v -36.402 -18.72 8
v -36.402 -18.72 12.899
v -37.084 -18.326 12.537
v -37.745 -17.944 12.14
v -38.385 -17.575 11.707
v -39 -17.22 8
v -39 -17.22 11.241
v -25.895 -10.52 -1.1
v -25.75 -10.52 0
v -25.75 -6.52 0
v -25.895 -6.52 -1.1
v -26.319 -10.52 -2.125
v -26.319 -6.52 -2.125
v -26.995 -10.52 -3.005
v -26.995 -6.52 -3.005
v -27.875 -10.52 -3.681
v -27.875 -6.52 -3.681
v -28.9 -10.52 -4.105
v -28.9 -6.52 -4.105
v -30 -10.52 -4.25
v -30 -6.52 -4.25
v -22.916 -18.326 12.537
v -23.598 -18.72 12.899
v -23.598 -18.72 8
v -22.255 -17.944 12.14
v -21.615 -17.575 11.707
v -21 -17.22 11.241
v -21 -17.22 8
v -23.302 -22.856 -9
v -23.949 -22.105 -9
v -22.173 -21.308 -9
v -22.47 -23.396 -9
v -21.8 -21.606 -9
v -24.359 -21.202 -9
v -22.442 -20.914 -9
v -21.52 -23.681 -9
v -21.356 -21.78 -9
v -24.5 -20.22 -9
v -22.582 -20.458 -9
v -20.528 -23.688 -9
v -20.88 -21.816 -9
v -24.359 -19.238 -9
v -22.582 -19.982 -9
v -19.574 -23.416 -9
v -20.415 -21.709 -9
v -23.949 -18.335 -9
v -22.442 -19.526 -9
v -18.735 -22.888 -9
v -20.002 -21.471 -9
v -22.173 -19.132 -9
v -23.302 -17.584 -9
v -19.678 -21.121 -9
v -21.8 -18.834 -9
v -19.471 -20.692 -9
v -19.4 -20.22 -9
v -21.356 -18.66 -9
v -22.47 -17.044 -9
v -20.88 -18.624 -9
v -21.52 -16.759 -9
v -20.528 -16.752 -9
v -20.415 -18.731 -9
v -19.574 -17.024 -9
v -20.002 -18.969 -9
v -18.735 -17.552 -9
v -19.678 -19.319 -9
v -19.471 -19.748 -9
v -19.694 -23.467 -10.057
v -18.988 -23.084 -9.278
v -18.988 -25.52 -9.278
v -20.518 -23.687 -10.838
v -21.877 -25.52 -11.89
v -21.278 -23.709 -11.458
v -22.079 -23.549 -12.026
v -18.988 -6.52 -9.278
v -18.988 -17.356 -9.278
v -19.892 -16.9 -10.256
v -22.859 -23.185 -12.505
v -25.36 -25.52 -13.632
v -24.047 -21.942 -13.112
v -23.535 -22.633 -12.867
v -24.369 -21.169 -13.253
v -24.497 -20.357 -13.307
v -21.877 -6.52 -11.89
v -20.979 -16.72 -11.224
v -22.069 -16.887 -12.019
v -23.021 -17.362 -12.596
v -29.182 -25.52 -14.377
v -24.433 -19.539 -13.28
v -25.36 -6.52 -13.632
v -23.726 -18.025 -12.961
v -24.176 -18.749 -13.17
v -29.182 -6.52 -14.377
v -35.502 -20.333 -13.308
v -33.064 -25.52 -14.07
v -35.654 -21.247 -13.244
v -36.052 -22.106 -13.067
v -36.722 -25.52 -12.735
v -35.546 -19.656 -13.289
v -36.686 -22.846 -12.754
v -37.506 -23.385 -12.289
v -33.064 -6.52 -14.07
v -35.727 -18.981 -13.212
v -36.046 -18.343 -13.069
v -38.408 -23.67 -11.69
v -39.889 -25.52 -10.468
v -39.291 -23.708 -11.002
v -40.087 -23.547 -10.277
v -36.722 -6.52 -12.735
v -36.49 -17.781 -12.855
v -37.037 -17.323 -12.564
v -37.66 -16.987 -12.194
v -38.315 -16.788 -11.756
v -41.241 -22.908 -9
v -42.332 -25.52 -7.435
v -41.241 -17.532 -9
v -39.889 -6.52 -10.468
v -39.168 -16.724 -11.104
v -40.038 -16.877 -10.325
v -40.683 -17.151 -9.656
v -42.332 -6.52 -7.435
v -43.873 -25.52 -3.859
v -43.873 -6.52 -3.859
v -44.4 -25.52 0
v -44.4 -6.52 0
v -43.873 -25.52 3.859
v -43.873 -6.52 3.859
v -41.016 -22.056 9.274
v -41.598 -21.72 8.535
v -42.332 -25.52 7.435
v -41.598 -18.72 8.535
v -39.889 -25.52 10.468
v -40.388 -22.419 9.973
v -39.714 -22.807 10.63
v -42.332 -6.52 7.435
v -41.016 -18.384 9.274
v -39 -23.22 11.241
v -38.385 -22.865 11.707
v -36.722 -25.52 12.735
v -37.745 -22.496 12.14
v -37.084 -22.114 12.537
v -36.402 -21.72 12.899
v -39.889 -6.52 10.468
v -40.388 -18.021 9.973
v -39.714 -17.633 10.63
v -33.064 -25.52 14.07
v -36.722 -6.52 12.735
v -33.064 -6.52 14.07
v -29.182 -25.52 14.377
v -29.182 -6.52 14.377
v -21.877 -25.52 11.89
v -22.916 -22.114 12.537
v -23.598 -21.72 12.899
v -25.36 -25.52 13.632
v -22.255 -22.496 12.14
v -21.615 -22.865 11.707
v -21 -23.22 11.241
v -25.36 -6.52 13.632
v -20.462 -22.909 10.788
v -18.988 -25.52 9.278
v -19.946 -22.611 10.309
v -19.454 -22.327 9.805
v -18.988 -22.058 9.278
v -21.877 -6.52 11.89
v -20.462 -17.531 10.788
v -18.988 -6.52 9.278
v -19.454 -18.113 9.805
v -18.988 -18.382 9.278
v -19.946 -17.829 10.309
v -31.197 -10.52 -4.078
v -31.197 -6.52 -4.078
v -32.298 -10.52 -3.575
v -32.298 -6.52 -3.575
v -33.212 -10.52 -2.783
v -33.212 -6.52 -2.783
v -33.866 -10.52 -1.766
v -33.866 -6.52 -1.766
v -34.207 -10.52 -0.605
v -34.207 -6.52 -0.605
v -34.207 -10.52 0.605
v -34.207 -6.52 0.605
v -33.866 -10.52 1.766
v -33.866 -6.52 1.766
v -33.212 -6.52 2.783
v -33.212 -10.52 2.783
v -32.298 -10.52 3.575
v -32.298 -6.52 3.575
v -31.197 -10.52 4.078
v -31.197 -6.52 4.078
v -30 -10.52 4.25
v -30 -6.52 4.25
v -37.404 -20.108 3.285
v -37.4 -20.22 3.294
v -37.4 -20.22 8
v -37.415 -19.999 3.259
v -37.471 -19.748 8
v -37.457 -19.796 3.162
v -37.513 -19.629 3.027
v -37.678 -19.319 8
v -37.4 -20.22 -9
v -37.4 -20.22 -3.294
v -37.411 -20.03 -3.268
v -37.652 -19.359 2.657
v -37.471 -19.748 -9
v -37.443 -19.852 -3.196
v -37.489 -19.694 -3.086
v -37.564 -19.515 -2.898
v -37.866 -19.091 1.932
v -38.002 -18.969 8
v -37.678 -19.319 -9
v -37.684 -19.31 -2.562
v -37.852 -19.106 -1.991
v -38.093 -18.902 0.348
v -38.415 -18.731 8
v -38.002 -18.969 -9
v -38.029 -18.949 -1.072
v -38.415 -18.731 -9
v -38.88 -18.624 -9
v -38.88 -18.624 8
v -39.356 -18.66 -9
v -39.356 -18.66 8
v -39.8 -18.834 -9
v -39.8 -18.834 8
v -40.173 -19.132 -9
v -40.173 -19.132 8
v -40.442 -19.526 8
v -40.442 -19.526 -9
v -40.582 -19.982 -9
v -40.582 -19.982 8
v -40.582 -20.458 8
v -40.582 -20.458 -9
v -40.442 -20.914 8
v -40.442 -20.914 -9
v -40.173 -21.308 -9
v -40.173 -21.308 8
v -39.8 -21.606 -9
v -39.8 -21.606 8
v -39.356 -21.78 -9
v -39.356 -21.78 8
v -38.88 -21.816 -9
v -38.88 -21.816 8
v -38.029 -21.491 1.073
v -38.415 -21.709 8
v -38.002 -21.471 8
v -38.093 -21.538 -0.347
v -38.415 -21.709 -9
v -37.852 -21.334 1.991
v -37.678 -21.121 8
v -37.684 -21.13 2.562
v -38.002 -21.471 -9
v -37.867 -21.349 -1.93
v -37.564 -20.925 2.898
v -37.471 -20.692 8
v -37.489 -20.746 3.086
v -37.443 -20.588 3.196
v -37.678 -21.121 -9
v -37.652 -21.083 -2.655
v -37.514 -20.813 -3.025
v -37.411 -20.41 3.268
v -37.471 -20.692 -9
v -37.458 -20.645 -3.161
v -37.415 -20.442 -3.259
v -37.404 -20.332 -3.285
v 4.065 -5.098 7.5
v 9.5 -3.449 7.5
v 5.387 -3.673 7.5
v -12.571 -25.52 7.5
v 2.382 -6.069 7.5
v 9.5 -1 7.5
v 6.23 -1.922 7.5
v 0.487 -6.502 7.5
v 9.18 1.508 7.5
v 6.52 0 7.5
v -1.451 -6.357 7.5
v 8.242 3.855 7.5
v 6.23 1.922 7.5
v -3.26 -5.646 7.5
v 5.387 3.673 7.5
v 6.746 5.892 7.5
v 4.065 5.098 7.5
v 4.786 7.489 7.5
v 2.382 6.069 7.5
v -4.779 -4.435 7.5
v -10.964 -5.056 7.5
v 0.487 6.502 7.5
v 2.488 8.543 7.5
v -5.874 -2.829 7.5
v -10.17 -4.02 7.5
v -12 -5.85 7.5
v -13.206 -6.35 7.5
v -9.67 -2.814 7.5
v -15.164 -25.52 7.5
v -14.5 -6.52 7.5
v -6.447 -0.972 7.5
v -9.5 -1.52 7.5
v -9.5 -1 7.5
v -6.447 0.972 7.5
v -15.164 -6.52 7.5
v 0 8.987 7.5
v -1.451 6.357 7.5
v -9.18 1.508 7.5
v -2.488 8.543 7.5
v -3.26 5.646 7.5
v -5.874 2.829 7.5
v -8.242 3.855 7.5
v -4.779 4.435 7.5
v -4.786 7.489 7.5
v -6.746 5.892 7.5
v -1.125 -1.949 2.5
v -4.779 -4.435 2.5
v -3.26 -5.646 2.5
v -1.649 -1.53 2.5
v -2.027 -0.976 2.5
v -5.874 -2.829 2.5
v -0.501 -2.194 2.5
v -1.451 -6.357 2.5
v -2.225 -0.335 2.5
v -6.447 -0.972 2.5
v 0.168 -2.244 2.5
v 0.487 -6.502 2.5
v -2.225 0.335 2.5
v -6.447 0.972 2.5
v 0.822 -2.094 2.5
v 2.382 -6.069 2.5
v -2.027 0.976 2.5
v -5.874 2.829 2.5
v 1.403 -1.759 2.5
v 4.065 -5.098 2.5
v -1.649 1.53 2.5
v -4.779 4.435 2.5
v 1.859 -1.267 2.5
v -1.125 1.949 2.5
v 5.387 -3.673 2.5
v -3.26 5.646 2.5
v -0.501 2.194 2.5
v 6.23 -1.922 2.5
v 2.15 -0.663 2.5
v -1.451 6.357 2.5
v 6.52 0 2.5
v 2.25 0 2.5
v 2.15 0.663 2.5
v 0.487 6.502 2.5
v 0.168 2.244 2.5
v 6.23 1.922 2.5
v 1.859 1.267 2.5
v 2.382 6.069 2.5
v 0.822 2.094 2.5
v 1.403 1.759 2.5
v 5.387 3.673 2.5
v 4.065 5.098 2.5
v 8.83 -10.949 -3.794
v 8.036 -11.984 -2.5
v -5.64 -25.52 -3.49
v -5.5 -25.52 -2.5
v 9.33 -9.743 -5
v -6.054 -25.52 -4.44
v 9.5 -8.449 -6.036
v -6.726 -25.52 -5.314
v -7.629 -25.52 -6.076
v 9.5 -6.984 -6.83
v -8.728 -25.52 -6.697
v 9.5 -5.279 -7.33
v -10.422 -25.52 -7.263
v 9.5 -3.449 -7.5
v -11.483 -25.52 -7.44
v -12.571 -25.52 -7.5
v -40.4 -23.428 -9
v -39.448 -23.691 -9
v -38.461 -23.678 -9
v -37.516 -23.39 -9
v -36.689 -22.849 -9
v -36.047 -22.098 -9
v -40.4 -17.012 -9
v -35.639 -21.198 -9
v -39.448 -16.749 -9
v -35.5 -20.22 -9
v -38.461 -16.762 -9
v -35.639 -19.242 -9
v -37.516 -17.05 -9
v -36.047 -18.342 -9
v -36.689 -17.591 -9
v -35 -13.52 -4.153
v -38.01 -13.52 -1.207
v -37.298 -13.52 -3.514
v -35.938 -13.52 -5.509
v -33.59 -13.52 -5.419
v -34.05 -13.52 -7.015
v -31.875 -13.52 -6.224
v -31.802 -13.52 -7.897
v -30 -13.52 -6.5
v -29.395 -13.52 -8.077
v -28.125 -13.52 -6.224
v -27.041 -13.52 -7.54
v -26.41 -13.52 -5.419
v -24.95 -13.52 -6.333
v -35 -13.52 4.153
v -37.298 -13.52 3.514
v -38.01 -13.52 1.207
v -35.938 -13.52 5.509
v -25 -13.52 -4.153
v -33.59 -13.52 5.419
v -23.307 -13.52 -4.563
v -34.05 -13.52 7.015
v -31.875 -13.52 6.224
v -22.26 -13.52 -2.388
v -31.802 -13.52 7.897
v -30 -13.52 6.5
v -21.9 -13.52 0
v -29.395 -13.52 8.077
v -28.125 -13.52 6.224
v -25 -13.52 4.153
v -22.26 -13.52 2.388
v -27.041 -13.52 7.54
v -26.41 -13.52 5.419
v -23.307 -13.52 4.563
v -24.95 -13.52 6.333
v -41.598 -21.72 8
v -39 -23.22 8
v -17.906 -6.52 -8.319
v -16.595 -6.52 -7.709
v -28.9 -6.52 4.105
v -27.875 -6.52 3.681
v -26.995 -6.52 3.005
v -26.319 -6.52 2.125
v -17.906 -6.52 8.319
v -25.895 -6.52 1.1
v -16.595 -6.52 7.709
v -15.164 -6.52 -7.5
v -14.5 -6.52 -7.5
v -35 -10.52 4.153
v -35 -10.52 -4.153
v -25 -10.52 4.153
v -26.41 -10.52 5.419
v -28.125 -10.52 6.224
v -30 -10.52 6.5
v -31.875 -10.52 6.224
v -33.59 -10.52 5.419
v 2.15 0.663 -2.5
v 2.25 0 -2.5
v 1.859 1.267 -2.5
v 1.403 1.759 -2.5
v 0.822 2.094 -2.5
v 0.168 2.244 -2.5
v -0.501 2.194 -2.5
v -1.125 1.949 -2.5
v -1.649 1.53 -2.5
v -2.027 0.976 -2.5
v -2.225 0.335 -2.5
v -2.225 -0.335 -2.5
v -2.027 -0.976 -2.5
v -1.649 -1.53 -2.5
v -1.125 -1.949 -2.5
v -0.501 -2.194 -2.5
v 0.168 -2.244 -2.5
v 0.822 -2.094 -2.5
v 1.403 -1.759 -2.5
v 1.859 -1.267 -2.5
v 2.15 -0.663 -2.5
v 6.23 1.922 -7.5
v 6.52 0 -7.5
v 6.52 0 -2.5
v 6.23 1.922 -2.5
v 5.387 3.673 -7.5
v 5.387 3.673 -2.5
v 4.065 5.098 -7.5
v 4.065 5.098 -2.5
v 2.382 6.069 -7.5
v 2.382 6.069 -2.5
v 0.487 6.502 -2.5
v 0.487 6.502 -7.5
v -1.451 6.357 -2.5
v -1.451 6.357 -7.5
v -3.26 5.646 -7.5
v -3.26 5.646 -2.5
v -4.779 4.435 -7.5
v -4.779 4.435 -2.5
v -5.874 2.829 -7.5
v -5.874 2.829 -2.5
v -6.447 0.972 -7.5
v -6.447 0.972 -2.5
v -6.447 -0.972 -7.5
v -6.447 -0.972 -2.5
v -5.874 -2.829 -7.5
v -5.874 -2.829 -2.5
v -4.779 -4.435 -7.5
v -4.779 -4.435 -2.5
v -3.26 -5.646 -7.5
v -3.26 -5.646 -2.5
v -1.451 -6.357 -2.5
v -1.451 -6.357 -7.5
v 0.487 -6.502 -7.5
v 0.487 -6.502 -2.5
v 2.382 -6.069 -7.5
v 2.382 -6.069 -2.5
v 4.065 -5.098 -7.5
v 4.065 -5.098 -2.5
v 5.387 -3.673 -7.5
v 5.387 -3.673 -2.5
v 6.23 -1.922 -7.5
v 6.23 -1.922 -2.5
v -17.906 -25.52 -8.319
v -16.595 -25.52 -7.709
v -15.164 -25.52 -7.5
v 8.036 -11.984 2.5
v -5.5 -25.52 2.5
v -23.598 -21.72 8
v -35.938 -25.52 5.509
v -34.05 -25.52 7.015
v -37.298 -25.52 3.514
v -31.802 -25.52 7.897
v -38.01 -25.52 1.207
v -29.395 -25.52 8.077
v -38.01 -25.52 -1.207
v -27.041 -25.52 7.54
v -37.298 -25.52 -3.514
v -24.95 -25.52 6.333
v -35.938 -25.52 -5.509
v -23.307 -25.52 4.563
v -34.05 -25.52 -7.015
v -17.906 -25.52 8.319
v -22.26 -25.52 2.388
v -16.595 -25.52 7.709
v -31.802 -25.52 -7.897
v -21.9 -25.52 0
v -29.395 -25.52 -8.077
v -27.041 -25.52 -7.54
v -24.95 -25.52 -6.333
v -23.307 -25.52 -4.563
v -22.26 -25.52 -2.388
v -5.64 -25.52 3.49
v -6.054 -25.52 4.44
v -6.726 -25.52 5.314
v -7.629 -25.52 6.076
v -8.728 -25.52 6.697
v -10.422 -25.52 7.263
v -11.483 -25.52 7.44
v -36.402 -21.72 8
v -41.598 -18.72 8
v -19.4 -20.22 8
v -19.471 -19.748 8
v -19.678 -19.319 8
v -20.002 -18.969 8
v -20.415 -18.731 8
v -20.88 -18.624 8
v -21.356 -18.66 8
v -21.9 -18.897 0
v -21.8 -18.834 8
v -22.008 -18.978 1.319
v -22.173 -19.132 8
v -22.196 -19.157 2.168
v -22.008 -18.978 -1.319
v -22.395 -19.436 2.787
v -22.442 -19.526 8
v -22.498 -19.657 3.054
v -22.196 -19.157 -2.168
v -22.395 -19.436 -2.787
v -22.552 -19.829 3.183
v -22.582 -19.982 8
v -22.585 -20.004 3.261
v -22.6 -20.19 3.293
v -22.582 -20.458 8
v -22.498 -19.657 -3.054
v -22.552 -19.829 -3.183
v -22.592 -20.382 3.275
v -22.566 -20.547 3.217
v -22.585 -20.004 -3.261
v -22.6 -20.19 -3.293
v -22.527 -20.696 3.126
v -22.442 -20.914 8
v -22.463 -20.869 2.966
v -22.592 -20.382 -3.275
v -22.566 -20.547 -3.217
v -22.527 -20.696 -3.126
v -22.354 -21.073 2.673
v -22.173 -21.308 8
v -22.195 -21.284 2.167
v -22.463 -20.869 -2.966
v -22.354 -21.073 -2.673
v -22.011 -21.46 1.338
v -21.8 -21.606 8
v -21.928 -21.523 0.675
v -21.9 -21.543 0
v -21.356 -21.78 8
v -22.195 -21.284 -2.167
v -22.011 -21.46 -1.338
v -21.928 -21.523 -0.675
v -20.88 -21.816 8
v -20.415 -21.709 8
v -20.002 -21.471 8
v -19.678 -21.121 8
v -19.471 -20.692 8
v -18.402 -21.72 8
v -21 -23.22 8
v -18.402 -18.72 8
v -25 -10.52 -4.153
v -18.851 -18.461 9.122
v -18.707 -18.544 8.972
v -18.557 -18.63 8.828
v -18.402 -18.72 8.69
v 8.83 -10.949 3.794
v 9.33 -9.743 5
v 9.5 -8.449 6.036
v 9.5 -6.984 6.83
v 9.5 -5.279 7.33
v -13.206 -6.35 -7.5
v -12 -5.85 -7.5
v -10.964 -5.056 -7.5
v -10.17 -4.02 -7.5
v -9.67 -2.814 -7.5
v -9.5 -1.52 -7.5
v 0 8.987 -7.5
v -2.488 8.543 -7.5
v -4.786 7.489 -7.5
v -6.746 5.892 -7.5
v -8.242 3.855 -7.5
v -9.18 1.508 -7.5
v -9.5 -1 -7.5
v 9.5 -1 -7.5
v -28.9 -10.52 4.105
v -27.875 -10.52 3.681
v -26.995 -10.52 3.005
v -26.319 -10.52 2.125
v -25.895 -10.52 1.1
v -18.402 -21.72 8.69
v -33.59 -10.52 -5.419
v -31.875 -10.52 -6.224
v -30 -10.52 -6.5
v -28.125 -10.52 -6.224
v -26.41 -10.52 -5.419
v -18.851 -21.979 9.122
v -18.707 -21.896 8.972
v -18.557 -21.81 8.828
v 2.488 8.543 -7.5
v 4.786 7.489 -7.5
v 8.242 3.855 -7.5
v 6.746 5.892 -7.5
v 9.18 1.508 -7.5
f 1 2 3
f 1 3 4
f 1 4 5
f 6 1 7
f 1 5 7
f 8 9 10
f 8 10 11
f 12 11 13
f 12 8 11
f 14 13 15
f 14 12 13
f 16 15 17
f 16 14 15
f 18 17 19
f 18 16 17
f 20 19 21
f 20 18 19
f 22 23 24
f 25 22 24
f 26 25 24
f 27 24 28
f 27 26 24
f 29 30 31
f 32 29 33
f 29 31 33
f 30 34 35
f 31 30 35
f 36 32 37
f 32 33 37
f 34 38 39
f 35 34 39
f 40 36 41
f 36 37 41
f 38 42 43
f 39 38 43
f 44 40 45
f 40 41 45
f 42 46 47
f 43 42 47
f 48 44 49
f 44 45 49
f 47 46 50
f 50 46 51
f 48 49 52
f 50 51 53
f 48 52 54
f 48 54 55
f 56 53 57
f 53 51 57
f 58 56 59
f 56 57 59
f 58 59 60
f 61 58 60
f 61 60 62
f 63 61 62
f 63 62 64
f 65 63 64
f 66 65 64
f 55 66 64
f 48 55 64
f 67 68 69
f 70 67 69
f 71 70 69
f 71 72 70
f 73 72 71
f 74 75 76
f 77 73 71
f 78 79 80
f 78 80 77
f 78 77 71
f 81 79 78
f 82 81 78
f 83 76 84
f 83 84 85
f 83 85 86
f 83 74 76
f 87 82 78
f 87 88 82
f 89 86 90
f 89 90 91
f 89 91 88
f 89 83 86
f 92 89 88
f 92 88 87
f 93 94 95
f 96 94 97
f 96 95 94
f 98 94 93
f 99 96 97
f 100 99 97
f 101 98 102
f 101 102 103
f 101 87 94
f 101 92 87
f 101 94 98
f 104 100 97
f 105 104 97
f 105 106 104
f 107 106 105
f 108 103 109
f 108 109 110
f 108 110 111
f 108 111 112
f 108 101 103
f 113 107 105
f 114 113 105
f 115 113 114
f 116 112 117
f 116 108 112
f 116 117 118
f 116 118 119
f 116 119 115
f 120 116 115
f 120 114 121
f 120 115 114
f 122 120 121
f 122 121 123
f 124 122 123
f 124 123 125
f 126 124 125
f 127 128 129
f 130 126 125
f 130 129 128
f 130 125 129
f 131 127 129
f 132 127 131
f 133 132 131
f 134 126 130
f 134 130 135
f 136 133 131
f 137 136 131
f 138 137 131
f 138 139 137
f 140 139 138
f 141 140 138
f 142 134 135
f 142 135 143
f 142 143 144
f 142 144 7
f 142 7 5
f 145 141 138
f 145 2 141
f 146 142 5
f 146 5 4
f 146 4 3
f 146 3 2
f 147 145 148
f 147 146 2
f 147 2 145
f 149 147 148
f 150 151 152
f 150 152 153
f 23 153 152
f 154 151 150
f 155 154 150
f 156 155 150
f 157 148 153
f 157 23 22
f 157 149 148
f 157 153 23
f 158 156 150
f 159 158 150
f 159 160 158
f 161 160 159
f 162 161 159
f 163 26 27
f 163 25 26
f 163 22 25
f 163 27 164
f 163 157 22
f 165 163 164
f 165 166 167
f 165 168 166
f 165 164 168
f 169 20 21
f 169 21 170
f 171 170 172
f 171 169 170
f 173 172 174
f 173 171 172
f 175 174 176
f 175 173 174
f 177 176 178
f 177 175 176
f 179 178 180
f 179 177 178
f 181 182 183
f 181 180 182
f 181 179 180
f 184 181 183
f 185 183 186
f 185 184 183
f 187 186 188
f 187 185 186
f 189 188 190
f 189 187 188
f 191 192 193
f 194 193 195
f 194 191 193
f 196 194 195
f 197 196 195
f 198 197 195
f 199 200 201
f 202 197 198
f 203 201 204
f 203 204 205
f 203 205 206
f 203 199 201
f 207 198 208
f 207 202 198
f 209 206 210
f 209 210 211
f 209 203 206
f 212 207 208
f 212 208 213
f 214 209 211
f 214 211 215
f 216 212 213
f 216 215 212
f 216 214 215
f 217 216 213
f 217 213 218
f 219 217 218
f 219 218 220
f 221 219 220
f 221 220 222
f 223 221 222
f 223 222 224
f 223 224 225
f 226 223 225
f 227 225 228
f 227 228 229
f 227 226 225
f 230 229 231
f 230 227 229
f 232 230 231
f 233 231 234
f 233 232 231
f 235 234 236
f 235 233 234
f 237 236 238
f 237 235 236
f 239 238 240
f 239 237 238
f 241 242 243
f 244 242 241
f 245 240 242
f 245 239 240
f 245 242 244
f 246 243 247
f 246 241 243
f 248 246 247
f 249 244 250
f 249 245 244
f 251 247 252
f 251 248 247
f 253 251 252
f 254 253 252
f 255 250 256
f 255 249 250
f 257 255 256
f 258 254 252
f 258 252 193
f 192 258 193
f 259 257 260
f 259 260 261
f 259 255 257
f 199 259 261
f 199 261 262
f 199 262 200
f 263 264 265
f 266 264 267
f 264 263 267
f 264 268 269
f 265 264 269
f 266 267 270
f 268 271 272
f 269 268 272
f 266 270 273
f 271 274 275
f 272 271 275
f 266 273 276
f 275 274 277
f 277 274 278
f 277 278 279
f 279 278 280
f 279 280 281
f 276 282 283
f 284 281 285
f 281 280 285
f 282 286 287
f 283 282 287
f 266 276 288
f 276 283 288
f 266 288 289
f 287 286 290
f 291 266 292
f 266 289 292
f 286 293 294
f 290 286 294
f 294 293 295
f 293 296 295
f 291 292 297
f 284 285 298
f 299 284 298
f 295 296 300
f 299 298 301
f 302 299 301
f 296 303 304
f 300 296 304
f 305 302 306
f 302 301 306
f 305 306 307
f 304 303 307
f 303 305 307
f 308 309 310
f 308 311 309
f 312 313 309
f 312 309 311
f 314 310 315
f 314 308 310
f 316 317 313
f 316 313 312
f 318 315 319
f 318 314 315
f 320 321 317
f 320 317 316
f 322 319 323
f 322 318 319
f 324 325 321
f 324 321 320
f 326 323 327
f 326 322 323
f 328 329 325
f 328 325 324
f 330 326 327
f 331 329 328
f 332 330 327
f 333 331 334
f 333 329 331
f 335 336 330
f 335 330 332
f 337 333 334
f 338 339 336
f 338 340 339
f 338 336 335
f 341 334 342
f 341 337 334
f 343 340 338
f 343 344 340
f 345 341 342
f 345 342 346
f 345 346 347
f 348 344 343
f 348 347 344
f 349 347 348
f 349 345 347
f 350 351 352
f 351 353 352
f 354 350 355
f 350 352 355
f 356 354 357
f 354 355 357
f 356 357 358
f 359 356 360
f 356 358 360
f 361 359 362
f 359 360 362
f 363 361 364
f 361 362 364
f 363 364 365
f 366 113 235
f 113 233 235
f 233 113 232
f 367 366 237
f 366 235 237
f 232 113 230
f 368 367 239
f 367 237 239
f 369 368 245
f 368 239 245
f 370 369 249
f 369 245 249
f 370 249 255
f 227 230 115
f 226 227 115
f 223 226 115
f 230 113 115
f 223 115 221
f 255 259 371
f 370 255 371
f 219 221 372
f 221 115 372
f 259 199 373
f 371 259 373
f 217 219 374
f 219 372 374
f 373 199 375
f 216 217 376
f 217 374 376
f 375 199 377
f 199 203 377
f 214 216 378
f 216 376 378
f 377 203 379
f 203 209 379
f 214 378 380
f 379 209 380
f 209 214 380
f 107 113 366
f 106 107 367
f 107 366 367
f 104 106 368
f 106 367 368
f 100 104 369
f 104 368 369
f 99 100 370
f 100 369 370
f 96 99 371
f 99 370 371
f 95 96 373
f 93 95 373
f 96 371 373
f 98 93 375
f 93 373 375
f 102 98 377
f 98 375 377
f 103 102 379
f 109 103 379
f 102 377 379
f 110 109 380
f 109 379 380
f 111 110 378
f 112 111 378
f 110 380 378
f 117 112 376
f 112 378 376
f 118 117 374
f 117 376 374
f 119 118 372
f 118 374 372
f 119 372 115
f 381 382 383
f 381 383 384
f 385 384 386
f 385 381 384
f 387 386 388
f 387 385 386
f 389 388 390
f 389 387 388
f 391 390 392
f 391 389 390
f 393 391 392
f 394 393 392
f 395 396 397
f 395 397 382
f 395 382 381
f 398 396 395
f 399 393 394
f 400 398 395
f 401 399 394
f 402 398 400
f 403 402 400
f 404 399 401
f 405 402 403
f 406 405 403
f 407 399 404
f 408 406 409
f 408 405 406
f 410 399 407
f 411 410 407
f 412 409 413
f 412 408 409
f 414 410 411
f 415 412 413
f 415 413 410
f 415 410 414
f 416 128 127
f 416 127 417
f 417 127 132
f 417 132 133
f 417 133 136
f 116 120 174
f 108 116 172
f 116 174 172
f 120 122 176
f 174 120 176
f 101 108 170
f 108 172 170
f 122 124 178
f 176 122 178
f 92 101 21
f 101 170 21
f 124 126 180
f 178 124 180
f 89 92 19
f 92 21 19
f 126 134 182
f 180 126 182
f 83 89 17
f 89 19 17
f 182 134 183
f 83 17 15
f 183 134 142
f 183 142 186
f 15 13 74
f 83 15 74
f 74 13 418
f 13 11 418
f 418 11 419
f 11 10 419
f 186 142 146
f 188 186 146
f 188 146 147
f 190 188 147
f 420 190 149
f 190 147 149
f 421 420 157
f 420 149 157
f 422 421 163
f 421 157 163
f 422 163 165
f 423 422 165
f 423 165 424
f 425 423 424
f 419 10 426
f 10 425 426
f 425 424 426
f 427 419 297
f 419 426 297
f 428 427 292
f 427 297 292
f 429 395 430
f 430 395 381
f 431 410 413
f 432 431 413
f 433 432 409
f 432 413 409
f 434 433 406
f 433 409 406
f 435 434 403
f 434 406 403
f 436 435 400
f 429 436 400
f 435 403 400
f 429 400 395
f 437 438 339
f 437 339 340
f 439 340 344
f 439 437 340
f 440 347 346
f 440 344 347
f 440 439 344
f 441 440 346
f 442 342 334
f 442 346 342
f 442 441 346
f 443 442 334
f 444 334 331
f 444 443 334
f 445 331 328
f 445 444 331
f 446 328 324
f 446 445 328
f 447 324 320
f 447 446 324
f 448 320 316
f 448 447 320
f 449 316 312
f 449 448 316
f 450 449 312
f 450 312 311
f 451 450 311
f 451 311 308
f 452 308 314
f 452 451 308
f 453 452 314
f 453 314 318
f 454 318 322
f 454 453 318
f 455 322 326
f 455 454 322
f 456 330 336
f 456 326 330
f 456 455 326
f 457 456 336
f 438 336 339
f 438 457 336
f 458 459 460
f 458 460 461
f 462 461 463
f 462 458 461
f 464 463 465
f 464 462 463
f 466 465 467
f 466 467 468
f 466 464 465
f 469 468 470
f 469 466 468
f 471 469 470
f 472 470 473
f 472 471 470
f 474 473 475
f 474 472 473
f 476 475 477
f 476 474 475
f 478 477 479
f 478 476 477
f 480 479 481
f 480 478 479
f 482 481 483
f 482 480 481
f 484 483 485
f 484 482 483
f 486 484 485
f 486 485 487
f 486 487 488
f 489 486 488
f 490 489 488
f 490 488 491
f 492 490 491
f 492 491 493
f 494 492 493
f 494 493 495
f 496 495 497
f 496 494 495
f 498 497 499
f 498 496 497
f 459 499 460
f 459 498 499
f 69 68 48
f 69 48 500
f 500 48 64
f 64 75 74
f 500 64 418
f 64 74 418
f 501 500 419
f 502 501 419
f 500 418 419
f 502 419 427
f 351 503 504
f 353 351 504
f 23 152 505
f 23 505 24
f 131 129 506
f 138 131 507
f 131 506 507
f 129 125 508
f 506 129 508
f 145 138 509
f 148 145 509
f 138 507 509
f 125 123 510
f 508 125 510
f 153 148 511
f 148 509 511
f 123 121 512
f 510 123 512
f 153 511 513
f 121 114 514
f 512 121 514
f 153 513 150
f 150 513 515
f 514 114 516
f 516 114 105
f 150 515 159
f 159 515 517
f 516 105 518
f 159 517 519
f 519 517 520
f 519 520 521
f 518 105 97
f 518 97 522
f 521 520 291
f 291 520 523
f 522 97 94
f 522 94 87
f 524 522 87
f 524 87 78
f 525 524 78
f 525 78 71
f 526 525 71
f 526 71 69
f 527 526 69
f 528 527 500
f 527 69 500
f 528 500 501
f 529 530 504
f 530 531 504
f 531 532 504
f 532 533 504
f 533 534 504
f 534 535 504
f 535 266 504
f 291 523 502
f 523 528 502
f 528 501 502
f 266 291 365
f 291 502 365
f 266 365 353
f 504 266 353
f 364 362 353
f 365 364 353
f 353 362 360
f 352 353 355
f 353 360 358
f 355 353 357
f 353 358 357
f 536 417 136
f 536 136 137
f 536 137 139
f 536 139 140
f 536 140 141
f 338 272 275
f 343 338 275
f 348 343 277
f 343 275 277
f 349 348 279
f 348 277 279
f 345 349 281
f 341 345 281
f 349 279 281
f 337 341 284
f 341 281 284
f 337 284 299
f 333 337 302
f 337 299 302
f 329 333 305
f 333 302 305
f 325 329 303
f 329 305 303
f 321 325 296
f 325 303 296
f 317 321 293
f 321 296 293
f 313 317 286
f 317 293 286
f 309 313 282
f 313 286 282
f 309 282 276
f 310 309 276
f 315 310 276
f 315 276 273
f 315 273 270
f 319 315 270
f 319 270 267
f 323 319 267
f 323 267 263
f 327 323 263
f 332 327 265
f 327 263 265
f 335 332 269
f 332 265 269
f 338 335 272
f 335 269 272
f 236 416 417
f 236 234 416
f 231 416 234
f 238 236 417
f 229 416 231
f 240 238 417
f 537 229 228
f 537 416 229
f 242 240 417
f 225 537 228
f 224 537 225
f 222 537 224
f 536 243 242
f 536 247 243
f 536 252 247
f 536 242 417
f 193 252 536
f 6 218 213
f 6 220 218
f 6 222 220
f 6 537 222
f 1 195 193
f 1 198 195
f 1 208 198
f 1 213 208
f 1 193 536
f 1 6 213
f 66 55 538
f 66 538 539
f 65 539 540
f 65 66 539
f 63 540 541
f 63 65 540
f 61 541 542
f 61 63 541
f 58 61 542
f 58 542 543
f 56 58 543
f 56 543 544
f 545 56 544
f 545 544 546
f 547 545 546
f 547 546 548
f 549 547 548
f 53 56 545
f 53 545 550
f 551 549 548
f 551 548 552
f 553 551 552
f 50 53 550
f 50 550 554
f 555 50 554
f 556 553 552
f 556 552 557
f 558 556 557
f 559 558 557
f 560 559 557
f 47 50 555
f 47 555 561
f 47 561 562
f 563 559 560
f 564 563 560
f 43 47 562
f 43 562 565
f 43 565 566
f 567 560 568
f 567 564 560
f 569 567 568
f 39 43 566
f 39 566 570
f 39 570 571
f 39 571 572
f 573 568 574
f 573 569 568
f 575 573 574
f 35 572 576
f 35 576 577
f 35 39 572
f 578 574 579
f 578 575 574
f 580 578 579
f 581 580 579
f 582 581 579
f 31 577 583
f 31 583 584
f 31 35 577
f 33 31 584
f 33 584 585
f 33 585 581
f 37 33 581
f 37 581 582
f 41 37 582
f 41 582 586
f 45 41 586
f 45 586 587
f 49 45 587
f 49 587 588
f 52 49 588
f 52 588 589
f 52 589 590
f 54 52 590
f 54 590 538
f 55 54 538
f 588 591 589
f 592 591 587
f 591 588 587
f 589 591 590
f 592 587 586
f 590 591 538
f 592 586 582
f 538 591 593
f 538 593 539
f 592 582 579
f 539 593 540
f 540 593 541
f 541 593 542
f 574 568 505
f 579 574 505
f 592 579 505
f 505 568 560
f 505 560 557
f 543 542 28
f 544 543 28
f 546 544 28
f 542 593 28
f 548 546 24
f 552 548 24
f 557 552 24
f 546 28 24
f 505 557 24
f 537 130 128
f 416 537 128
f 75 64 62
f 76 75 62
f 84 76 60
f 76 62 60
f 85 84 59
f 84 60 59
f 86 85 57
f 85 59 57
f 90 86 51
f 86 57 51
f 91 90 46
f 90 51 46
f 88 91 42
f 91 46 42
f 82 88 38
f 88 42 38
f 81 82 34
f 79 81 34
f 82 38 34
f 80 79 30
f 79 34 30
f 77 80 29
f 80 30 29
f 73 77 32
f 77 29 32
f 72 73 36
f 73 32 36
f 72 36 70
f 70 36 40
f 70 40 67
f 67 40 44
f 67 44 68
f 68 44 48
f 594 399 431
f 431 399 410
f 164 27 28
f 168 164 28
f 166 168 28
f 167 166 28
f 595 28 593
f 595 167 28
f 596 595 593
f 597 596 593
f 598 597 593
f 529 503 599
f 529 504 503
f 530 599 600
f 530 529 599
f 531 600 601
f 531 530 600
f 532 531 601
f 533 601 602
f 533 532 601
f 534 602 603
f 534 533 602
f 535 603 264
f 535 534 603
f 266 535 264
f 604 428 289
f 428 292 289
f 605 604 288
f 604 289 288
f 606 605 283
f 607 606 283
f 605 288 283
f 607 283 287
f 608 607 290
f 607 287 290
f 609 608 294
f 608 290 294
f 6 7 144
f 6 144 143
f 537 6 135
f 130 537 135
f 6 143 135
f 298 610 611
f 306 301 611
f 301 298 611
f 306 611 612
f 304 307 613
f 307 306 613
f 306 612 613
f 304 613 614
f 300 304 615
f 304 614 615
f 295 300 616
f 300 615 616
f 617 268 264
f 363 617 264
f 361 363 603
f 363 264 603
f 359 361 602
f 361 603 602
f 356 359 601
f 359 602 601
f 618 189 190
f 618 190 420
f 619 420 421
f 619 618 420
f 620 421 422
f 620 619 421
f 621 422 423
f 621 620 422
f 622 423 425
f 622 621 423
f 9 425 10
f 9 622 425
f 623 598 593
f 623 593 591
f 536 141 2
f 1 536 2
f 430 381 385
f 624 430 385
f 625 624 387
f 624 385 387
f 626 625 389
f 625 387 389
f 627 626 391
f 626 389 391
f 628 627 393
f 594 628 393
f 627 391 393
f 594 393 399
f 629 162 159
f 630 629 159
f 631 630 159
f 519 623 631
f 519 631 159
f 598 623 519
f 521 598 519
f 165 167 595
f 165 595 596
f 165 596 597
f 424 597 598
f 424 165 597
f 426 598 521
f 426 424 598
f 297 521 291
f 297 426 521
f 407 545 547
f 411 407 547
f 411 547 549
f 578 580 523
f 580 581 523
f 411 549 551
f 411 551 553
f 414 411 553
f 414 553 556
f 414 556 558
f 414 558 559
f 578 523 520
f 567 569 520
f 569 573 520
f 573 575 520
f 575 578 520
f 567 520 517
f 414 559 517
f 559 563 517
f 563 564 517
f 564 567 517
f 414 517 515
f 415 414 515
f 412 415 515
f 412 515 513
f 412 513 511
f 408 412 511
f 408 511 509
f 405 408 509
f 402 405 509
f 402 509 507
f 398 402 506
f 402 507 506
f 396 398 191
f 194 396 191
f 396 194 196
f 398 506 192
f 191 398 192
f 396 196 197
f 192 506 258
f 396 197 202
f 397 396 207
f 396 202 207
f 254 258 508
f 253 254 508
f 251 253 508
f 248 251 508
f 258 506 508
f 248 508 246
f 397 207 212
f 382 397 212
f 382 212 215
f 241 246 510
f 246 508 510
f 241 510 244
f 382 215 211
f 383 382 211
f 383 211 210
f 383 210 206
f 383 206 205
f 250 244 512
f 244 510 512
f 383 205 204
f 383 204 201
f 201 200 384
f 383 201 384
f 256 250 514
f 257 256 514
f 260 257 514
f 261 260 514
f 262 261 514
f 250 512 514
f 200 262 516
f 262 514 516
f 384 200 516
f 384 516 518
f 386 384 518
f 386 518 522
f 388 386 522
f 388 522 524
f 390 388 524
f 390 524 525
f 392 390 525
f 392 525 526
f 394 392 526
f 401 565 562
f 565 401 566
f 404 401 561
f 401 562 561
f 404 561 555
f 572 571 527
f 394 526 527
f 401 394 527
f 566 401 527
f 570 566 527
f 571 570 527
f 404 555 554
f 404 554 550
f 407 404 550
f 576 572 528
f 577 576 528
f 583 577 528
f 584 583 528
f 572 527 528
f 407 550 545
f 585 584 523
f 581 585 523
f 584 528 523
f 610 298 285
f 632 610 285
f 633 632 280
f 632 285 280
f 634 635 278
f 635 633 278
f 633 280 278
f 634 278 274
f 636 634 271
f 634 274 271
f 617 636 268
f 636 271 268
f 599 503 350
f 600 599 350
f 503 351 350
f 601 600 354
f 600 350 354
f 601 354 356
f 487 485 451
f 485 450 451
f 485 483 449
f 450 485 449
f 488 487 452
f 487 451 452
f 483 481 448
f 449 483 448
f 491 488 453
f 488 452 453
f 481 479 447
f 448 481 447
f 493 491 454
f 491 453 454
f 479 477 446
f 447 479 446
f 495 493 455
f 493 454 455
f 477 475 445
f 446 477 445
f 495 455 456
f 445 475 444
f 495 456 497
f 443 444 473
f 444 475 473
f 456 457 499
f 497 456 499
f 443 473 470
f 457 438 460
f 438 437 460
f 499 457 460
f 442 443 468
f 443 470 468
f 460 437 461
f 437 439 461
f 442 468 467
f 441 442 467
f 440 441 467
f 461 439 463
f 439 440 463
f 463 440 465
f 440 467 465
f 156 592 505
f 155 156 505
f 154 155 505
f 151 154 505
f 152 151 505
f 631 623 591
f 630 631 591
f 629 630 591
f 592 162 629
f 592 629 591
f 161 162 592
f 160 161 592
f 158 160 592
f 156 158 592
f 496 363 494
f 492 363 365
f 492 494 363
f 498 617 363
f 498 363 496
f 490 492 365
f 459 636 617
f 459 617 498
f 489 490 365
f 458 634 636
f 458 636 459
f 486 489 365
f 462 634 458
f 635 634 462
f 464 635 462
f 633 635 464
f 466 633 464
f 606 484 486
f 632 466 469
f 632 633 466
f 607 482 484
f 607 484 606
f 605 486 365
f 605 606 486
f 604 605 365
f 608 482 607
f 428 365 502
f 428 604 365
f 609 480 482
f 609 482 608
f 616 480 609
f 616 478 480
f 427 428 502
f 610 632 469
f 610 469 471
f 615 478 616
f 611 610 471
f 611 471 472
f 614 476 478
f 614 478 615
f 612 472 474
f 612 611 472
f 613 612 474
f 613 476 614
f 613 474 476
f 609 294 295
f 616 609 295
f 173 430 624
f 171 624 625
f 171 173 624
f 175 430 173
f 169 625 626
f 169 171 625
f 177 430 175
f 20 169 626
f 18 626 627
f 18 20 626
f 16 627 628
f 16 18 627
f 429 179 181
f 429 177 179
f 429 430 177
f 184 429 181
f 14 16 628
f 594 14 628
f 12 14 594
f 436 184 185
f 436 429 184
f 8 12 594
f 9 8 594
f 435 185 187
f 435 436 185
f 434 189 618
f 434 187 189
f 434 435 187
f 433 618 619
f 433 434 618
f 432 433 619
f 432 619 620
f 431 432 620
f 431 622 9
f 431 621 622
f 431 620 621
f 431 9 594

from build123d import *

# Parameters (mm, degrees)
SKETCH1_R               = 2.25
BOSS_EXTRUDE1_DEPTH     = 7.5
CUT_EXTRUDE1_START      = 7.5
SKETCH1_3_R             = 6.52
CUT_EXTRUDE1_DEPTH      = 5
CUT_EXTRUDE2_START      = -7.5
SKETCH1_4_R             = 6.52
CUT_EXTRUDE2_DEPTH      = 5
SKETCH2_R               = 14.4
BOSS_EXTRUDE2_DEPTH     = 19
CUT_EXTRUDE3_DEPTH      = 51.395634732
CUT_EXTRUDE3_DEPTH_BACK = 51.395634732
FILLET1_R               = 5
FILLET2_R               = 10
CUT_EXTRUDE6_DEPTH      = 15
SKETCH5_R               = 8.1
CUT_EXTRUDE7_DEPTH      = 12
CUT_EXTRUDE8_DEPTH      = 54.197654084
CUT_EXTRUDE8_DEPTH_BACK = 54.197654084
SKETCH6_R               = 1.6
CUT_EXTRUDE9_START      = 20
SKETCH6_3_R             = 1.6
CUT_EXTRUDE9_DEPTH      = 12
CUT_EXTRUDE10_START     = -9
SKETCH6_4_R             = 3.5
CUT_EXTRUDE10_DEPTH     = 12
FILLET3_R               = 5


with BuildPart() as part:
    # Sketch1 → Boss-Extrude1 (new, symmetric)
    with BuildSketch(Plane.XY):
        Polygon((-9.5, 9), (9.5, 9), (9.5, -10.52), (-5.5, -25.52), (-30, -25.52), (-30, -6.52), (-9.5, -6.52), align=None)
        Circle(SKETCH1_R, mode=Mode.SUBTRACT)
    extrude(amount=BOSS_EXTRUDE1_DEPTH, both=True)

    # Sketch1<3> → Cut-Extrude1 (cut)
    with BuildSketch(Plane.XY.offset(CUT_EXTRUDE1_START)):
        Circle(SKETCH1_3_R)
    extrude(amount=-CUT_EXTRUDE1_DEPTH, mode=Mode.SUBTRACT)

    # Sketch1<4> → Cut-Extrude2 (cut)
    with BuildSketch(Plane.XY.offset(CUT_EXTRUDE2_START)):
        Circle(SKETCH1_4_R)
    extrude(amount=CUT_EXTRUDE2_DEPTH, mode=Mode.SUBTRACT)

    # Sketch2 → Boss-Extrude2 (add, through all)
    with BuildSketch(Plane(origin=(0, -6.52, 0), x_dir=(1, 0, 0), z_dir=(0, 1, 0))):
        with Locations((-30, 0)):
            Circle(SKETCH2_R)
    extrude(amount=-BOSS_EXTRUDE2_DEPTH)

    # Sketch2<3> → Cut-Extrude3 (cut, two sides: drawn at the far end of the back side and taken through both)
    with BuildSketch(Plane(origin=(0, -6.52, 0), x_dir=(1, 0, 0), z_dir=(0, 1, 0)).offset(-CUT_EXTRUDE3_DEPTH_BACK)):
        with BuildLine():
            ThreePointArc((-30, -4.25), (-26.99479618, -3.00520382), (-25.75, 0))
            ThreePointArc((-25.75, 0), (-26.99479618, 3.00520382), (-30, 4.25))
            Line((-30, 4.25), (-30, -4.25))
        make_face()
        with BuildLine():
            Line((-30, -4.25), (-30, 4.25))
            ThreePointArc((-30, 4.25), (-34.25, 0), (-30, -4.25))
        make_face()
    extrude(amount=CUT_EXTRUDE3_DEPTH + CUT_EXTRUDE3_DEPTH_BACK, mode=Mode.SUBTRACT)

    # Fillet1
    fillet1_edges = [part.edges().sort_by_distance(p)[0] for p in [
        (-9.5, -6.52, 0),
        (-17.707319251, -16.02, -7.5),
        (-17.707319251, -16.02, 7.5),
    ]]
    fillet(fillet1_edges, radius=FILLET1_R)

    # Fillet2
    # the kernel refuses this fillet: 10 mm, written as the material it takes off along each edge
    with BuildSketch(Plane(origin=(-9.5, 9, -32.5), x_dir=(0, -1, 0), z_dir=(0, 0, 1))) as fillet2_piece_1:
        with BuildLine():
            CenterArc((FILLET2_R, FILLET2_R), FILLET2_R, 180, 90)
            Line((0, FILLET2_R), (0, 0))
            Line((0, 0), (FILLET2_R, 0))
        make_face()
    extrude(amount=65, mode=Mode.SUBTRACT)
    with BuildSketch(Plane(origin=(9.5, 9, 32.5), x_dir=(-1, 0, 0), z_dir=(0, 0, -1))) as fillet2_piece_2:
        with BuildLine():
            CenterArc((FILLET2_R, -FILLET2_R), FILLET2_R, 90, 90)
            Line((0, -FILLET2_R), (0, 0))
            Line((0, 0), (FILLET2_R, 0))
        make_face()
    extrude(amount=65, mode=Mode.SUBTRACT)

    # Sketch4 → Cut-Extrude6 (cut)
    with BuildSketch(Plane.XZ.offset(25.52)):
        with BuildLine():
            Line((-25, -4.153311931), (-25, 4.153311931))
            ThreePointArc((-25, 4.153311931), (-30, 6.5), (-35, 4.153311931))
            Line((-35, 4.153311931), (-35, -4.153311931))
            ThreePointArc((-35, -4.153311931), (-30, -6.5), (-25, -4.153311931))
        make_face()
    extrude(amount=-CUT_EXTRUDE6_DEPTH, mode=Mode.SUBTRACT)

    # Sketch5 → Cut-Extrude7 (cut)
    with BuildSketch(Plane.XZ.offset(25.52)):
        with Locations((-30, 0)):
            Circle(SKETCH5_R)
    extrude(amount=-CUT_EXTRUDE7_DEPTH, mode=Mode.SUBTRACT)

    # Sketch6 → Cut-Extrude8 (cut, two sides: drawn at the far end of the back side and taken through both)
    with BuildSketch(Plane.XY.offset(-CUT_EXTRUDE8_DEPTH_BACK)):
        with Locations((-39, -20.22)):
            Circle(SKETCH6_R)
        with Locations((-21, -20.22)):
            Circle(SKETCH6_R)
    extrude(amount=CUT_EXTRUDE8_DEPTH + CUT_EXTRUDE8_DEPTH_BACK, mode=Mode.SUBTRACT)

    # Sketch6<3> → Cut-Extrude9 (cut)
    # profile 1 of 2: a face of its own
    with BuildSketch(Plane.XY.offset(CUT_EXTRUDE9_START)):
        Polygon((-36.401923789, -21.72), (-36.401923789, -18.72), (-39, -17.22), (-41.598076211, -18.72), (-41.598076211, -21.72), (-39, -23.22), align=None)
        with Locations((-39, -20.22)):
            Circle(SKETCH6_3_R, mode=Mode.SUBTRACT)
    # profile 2 of 2: a face of its own
    with BuildSketch(Plane.XY.offset(CUT_EXTRUDE9_START)):
        Polygon((-23.598076211, -18.72), (-21, -17.22), (-18.401923789, -18.72), (-18.401923789, -21.72), (-21, -23.22), (-23.598076211, -21.72), align=None)
        with Locations((-21, -20.22)):
            Circle(SKETCH6_3_R, mode=Mode.SUBTRACT)
    extrude(amount=-CUT_EXTRUDE9_DEPTH, mode=Mode.SUBTRACT)

    # Sketch6<4> → Cut-Extrude10 (cut)
    with BuildSketch(Plane.XY.offset(CUT_EXTRUDE10_START)):
        with Locations((-39, -20.22)):
            Circle(SKETCH6_4_R)
        with Locations((-21, -20.22)):
            Circle(SKETCH6_4_R)
    extrude(amount=-CUT_EXTRUDE10_DEPTH, mode=Mode.SUBTRACT)

    # Fillet3
    fillet3_edges = [part.edges().sort_by_distance(p)[0] for p in [
        (2, -18.02, -7.5),
        (9.5, -10.52, 0),
        (2, -18.02, 7.5),
    ]]
    fillet(fillet3_edges, radius=FILLET3_R)


solid = part.part
